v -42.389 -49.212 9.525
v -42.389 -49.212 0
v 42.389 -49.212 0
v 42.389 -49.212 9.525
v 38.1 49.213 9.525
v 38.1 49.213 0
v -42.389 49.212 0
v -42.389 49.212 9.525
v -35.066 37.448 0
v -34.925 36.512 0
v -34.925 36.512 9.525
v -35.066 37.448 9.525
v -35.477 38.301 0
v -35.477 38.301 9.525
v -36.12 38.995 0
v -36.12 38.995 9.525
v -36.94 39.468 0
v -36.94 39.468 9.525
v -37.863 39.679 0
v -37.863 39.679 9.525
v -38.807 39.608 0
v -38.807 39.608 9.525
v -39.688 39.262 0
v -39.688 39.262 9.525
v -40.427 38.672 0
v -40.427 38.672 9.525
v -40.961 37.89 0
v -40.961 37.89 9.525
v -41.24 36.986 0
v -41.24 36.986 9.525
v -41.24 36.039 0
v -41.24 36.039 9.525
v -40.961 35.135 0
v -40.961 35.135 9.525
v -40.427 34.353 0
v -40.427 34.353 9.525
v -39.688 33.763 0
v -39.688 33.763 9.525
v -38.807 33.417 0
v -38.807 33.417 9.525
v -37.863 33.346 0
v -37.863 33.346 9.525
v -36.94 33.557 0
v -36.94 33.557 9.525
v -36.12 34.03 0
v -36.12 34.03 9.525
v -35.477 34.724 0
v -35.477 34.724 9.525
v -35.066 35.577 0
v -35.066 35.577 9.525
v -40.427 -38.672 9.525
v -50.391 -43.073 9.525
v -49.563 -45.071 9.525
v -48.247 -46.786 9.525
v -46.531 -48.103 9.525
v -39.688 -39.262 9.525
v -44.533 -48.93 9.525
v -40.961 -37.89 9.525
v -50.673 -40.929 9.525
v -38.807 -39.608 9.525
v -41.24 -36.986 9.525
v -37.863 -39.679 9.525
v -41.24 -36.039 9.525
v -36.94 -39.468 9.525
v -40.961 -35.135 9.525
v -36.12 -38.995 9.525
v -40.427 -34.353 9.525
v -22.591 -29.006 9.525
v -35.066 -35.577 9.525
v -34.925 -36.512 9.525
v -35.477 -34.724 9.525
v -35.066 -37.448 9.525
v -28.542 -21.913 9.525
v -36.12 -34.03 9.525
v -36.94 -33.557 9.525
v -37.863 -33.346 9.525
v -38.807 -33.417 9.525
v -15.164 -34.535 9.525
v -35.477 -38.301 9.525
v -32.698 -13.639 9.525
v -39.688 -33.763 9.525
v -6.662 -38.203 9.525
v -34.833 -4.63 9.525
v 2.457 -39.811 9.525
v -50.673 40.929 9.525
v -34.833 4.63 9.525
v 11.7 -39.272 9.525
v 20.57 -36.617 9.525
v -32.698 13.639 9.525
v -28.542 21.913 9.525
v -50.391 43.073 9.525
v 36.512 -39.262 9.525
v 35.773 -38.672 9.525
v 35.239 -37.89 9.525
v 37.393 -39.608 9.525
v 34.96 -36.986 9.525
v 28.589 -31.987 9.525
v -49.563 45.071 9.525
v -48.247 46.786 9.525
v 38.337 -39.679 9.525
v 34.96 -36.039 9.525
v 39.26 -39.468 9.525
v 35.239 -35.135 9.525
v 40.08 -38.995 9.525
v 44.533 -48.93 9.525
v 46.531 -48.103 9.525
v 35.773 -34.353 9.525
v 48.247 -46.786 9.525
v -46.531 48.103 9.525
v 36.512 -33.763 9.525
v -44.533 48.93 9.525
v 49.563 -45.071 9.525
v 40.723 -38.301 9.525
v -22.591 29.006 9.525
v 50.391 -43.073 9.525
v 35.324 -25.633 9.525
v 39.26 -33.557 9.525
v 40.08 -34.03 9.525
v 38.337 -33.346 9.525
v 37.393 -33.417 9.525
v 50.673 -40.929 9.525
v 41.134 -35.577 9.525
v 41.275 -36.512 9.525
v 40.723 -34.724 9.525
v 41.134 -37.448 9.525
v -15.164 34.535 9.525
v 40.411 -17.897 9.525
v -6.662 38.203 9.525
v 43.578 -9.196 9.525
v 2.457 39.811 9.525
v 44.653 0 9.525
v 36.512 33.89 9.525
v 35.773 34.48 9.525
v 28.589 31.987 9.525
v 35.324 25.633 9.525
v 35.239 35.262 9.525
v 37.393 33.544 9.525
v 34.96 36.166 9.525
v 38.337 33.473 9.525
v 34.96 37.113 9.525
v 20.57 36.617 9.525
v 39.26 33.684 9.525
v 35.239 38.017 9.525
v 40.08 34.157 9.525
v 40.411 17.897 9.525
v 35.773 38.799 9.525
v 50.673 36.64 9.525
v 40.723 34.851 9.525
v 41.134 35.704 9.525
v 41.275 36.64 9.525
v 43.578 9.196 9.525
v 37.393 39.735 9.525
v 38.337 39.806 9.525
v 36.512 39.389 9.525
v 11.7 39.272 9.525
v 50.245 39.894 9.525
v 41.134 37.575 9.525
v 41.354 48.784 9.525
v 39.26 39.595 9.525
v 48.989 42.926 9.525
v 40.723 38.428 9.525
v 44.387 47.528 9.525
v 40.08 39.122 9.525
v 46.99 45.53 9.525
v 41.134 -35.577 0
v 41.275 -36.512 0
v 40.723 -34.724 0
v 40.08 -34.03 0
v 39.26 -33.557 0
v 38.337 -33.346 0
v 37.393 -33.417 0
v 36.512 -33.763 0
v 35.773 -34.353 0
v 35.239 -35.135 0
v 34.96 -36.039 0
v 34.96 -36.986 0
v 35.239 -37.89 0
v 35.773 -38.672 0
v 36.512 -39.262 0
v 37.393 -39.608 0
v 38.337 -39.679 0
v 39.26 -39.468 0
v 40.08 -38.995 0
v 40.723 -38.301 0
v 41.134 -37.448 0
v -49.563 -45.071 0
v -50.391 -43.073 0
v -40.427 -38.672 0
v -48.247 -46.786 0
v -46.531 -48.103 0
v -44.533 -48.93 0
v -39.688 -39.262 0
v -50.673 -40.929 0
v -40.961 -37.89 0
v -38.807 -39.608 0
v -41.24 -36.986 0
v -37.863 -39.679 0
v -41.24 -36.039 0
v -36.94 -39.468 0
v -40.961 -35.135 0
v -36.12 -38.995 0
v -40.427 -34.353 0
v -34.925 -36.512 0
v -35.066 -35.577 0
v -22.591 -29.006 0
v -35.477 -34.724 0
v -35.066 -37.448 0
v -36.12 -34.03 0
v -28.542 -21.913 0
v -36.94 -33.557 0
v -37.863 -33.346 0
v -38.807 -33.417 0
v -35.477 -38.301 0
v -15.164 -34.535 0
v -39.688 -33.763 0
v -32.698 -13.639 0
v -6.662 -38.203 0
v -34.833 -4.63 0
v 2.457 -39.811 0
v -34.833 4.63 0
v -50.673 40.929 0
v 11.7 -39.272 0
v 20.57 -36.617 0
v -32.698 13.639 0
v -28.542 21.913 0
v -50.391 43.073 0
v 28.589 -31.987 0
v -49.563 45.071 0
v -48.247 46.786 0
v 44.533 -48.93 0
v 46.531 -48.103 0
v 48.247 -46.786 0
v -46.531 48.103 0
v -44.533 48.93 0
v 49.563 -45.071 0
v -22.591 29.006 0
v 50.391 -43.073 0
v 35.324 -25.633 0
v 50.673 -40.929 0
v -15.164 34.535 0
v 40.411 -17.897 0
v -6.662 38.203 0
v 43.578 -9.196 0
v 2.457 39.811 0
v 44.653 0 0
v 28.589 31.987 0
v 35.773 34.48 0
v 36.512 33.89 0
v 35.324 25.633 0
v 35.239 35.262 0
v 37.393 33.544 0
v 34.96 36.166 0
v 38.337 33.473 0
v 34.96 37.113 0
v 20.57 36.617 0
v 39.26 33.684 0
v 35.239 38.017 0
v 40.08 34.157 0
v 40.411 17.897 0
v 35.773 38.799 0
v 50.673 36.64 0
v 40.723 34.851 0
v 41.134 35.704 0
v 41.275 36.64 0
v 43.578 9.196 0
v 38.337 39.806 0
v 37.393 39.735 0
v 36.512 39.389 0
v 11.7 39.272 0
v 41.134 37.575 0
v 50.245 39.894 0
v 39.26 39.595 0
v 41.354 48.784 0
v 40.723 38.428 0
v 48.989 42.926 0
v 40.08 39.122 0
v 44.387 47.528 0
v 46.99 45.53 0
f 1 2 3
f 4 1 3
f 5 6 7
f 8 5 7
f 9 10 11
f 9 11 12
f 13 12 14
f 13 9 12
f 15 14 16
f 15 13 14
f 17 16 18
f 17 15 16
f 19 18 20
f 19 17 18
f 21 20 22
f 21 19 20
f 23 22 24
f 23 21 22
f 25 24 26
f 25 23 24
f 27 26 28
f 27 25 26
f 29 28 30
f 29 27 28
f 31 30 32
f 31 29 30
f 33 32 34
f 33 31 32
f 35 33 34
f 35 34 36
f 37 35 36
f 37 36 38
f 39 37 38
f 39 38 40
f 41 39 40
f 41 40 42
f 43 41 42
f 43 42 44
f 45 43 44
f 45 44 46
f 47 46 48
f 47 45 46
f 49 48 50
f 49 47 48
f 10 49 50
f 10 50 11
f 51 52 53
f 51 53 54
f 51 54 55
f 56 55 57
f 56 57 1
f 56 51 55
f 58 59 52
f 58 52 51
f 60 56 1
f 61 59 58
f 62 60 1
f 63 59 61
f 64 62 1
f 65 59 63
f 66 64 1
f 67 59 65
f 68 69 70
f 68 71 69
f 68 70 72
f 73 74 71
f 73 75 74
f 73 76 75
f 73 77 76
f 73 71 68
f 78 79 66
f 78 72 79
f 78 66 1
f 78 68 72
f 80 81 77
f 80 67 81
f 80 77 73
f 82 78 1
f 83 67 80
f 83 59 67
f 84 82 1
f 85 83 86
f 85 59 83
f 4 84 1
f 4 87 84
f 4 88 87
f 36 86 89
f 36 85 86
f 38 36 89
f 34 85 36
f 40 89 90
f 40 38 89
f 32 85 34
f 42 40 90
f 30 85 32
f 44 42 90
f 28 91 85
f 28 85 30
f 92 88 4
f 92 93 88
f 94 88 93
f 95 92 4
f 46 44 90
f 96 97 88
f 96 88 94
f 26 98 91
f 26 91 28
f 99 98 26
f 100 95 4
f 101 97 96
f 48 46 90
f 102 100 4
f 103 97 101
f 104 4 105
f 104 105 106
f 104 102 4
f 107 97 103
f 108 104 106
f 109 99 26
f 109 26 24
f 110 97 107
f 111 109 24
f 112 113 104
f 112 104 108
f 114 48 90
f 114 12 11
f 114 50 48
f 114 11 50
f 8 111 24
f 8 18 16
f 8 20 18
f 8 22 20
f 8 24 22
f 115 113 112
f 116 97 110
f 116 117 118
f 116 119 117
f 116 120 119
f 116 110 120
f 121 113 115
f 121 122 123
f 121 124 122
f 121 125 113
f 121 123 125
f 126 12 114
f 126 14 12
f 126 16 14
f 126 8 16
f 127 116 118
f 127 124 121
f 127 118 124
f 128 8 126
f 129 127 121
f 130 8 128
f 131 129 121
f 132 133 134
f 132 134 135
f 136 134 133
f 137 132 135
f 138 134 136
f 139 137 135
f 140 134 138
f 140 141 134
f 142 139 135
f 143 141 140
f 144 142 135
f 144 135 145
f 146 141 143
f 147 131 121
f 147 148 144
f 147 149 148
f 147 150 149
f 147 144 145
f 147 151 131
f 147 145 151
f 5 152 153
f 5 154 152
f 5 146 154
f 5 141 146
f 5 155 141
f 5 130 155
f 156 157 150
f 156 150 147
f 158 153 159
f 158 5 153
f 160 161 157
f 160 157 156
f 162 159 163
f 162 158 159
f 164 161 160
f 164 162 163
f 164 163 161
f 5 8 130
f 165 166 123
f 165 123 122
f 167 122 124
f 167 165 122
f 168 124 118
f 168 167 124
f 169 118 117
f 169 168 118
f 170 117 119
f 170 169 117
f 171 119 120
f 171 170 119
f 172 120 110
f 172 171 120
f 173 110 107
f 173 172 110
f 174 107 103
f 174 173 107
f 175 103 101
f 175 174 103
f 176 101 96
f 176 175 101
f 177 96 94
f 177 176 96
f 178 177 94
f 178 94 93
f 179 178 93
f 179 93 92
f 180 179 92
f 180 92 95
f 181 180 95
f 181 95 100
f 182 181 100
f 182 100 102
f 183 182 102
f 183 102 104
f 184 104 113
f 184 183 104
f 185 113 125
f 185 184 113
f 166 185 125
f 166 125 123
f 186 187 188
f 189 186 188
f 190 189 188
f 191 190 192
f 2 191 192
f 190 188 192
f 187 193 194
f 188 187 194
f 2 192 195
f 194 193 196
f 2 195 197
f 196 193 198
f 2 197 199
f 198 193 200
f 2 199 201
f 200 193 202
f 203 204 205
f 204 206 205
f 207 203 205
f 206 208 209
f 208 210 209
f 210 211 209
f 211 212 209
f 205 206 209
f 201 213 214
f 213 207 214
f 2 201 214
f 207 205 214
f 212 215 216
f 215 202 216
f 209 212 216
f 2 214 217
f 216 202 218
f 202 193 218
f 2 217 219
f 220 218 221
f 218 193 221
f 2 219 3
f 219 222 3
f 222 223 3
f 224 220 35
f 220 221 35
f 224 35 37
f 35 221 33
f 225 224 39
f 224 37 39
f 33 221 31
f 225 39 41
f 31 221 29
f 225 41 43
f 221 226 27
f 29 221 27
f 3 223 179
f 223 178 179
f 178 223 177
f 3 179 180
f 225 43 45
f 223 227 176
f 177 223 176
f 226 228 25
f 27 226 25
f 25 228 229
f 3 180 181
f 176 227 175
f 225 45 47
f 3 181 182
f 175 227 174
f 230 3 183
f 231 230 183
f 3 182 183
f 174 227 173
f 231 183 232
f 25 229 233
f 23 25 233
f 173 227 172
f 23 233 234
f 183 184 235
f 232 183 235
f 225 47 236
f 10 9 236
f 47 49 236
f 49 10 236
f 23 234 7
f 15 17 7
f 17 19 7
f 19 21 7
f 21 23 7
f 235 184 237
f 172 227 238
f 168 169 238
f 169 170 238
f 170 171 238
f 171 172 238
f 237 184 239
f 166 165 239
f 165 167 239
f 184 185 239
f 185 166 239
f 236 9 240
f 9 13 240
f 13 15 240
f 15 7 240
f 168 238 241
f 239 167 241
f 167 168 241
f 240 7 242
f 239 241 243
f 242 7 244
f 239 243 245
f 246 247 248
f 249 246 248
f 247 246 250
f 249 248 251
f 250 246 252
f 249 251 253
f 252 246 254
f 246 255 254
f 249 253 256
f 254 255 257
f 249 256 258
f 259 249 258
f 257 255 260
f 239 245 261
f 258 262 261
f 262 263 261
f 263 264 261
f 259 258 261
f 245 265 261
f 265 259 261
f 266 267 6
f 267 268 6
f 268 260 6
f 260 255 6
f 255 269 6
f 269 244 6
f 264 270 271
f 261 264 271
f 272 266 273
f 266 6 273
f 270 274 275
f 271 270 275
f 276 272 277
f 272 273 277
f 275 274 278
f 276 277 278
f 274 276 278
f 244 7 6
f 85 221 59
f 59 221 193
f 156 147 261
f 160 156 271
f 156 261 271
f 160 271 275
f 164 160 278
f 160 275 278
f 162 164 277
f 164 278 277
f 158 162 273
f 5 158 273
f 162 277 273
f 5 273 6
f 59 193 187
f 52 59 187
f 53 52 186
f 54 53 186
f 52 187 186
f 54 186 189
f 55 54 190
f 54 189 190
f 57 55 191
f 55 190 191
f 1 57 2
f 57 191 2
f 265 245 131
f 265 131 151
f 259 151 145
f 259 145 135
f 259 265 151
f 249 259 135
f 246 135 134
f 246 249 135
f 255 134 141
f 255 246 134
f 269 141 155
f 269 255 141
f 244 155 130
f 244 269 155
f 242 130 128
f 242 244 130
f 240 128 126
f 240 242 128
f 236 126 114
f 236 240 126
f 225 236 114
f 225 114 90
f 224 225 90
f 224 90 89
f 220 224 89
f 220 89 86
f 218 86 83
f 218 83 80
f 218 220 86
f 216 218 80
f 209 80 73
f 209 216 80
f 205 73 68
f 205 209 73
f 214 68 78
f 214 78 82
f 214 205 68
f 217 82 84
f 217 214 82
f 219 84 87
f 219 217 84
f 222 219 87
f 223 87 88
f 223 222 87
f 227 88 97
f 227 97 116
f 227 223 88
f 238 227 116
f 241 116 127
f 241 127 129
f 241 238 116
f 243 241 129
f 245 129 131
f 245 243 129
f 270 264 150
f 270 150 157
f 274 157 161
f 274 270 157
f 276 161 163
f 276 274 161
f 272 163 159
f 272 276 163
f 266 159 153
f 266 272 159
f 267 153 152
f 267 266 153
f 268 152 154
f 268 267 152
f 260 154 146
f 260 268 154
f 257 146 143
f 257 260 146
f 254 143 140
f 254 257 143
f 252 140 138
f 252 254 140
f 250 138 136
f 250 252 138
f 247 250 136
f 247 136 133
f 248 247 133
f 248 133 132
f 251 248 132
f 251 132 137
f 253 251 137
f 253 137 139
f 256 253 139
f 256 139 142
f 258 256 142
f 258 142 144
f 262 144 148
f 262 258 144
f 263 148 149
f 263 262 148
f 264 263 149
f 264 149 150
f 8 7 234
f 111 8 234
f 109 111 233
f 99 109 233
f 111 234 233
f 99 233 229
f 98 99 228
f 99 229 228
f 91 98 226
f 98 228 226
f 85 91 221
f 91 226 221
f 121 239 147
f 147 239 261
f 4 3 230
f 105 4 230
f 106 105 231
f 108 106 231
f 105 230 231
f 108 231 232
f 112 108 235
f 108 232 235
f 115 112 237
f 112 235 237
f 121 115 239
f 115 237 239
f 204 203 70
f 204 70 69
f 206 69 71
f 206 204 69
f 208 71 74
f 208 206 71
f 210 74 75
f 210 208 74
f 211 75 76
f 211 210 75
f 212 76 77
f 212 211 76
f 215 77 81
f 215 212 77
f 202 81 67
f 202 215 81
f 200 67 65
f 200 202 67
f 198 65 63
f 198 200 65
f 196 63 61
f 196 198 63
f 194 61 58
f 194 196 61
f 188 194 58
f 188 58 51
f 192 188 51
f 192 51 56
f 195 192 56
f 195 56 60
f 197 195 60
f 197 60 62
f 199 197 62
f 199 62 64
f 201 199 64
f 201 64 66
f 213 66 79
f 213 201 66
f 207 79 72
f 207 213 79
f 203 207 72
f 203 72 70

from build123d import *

# Parameters (mm, degrees)
F0_R     = 3.175
F0_R_2   = 39.878
F1_DEPTH = 9.525


with BuildPart() as f1:
    # F0 (on Top) → F1 (new body)
    with BuildSketch(Plane.XY):
        with BuildLine():
            Line((38.1, 49.2125), (-42.389483, 49.2125))
            ThreePointArc((-42.389483, 49.2125), (-48.246814, 46.786314), (-50.673, 40.928983))
            Line((-50.673, 40.928983), (-50.673, -40.928983))
            ThreePointArc((-50.673, -40.928983), (-48.246814, -46.786314), (-42.389483, -49.2125))
            Line((-42.389483, -49.2125), (42.389483, -49.2125))
            ThreePointArc((42.389483, -49.2125), (48.246814, -46.786314), (50.673, -40.928983))
            Line((50.673, -40.928983), (50.673, 36.6395))
            ThreePointArc((50.673, 36.6395), (46.990454, 45.529954), (38.1, 49.2125))
        make_face()
        with Locations((-38.1, -36.5125)):
            Circle(F0_R, mode=Mode.SUBTRACT)
        with Locations((38.1, -36.5125)):
            Circle(F0_R, mode=Mode.SUBTRACT)
        with Locations((-38.1, 36.5125)):
            Circle(F0_R, mode=Mode.SUBTRACT)
        with Locations((4.7752, 0)):
            Circle(F0_R_2, mode=Mode.SUBTRACT)
        with Locations((38.1, 36.6395)):
            Circle(F0_R, mode=Mode.SUBTRACT)
    extrude(amount=F1_DEPTH)


solid = f1.part
